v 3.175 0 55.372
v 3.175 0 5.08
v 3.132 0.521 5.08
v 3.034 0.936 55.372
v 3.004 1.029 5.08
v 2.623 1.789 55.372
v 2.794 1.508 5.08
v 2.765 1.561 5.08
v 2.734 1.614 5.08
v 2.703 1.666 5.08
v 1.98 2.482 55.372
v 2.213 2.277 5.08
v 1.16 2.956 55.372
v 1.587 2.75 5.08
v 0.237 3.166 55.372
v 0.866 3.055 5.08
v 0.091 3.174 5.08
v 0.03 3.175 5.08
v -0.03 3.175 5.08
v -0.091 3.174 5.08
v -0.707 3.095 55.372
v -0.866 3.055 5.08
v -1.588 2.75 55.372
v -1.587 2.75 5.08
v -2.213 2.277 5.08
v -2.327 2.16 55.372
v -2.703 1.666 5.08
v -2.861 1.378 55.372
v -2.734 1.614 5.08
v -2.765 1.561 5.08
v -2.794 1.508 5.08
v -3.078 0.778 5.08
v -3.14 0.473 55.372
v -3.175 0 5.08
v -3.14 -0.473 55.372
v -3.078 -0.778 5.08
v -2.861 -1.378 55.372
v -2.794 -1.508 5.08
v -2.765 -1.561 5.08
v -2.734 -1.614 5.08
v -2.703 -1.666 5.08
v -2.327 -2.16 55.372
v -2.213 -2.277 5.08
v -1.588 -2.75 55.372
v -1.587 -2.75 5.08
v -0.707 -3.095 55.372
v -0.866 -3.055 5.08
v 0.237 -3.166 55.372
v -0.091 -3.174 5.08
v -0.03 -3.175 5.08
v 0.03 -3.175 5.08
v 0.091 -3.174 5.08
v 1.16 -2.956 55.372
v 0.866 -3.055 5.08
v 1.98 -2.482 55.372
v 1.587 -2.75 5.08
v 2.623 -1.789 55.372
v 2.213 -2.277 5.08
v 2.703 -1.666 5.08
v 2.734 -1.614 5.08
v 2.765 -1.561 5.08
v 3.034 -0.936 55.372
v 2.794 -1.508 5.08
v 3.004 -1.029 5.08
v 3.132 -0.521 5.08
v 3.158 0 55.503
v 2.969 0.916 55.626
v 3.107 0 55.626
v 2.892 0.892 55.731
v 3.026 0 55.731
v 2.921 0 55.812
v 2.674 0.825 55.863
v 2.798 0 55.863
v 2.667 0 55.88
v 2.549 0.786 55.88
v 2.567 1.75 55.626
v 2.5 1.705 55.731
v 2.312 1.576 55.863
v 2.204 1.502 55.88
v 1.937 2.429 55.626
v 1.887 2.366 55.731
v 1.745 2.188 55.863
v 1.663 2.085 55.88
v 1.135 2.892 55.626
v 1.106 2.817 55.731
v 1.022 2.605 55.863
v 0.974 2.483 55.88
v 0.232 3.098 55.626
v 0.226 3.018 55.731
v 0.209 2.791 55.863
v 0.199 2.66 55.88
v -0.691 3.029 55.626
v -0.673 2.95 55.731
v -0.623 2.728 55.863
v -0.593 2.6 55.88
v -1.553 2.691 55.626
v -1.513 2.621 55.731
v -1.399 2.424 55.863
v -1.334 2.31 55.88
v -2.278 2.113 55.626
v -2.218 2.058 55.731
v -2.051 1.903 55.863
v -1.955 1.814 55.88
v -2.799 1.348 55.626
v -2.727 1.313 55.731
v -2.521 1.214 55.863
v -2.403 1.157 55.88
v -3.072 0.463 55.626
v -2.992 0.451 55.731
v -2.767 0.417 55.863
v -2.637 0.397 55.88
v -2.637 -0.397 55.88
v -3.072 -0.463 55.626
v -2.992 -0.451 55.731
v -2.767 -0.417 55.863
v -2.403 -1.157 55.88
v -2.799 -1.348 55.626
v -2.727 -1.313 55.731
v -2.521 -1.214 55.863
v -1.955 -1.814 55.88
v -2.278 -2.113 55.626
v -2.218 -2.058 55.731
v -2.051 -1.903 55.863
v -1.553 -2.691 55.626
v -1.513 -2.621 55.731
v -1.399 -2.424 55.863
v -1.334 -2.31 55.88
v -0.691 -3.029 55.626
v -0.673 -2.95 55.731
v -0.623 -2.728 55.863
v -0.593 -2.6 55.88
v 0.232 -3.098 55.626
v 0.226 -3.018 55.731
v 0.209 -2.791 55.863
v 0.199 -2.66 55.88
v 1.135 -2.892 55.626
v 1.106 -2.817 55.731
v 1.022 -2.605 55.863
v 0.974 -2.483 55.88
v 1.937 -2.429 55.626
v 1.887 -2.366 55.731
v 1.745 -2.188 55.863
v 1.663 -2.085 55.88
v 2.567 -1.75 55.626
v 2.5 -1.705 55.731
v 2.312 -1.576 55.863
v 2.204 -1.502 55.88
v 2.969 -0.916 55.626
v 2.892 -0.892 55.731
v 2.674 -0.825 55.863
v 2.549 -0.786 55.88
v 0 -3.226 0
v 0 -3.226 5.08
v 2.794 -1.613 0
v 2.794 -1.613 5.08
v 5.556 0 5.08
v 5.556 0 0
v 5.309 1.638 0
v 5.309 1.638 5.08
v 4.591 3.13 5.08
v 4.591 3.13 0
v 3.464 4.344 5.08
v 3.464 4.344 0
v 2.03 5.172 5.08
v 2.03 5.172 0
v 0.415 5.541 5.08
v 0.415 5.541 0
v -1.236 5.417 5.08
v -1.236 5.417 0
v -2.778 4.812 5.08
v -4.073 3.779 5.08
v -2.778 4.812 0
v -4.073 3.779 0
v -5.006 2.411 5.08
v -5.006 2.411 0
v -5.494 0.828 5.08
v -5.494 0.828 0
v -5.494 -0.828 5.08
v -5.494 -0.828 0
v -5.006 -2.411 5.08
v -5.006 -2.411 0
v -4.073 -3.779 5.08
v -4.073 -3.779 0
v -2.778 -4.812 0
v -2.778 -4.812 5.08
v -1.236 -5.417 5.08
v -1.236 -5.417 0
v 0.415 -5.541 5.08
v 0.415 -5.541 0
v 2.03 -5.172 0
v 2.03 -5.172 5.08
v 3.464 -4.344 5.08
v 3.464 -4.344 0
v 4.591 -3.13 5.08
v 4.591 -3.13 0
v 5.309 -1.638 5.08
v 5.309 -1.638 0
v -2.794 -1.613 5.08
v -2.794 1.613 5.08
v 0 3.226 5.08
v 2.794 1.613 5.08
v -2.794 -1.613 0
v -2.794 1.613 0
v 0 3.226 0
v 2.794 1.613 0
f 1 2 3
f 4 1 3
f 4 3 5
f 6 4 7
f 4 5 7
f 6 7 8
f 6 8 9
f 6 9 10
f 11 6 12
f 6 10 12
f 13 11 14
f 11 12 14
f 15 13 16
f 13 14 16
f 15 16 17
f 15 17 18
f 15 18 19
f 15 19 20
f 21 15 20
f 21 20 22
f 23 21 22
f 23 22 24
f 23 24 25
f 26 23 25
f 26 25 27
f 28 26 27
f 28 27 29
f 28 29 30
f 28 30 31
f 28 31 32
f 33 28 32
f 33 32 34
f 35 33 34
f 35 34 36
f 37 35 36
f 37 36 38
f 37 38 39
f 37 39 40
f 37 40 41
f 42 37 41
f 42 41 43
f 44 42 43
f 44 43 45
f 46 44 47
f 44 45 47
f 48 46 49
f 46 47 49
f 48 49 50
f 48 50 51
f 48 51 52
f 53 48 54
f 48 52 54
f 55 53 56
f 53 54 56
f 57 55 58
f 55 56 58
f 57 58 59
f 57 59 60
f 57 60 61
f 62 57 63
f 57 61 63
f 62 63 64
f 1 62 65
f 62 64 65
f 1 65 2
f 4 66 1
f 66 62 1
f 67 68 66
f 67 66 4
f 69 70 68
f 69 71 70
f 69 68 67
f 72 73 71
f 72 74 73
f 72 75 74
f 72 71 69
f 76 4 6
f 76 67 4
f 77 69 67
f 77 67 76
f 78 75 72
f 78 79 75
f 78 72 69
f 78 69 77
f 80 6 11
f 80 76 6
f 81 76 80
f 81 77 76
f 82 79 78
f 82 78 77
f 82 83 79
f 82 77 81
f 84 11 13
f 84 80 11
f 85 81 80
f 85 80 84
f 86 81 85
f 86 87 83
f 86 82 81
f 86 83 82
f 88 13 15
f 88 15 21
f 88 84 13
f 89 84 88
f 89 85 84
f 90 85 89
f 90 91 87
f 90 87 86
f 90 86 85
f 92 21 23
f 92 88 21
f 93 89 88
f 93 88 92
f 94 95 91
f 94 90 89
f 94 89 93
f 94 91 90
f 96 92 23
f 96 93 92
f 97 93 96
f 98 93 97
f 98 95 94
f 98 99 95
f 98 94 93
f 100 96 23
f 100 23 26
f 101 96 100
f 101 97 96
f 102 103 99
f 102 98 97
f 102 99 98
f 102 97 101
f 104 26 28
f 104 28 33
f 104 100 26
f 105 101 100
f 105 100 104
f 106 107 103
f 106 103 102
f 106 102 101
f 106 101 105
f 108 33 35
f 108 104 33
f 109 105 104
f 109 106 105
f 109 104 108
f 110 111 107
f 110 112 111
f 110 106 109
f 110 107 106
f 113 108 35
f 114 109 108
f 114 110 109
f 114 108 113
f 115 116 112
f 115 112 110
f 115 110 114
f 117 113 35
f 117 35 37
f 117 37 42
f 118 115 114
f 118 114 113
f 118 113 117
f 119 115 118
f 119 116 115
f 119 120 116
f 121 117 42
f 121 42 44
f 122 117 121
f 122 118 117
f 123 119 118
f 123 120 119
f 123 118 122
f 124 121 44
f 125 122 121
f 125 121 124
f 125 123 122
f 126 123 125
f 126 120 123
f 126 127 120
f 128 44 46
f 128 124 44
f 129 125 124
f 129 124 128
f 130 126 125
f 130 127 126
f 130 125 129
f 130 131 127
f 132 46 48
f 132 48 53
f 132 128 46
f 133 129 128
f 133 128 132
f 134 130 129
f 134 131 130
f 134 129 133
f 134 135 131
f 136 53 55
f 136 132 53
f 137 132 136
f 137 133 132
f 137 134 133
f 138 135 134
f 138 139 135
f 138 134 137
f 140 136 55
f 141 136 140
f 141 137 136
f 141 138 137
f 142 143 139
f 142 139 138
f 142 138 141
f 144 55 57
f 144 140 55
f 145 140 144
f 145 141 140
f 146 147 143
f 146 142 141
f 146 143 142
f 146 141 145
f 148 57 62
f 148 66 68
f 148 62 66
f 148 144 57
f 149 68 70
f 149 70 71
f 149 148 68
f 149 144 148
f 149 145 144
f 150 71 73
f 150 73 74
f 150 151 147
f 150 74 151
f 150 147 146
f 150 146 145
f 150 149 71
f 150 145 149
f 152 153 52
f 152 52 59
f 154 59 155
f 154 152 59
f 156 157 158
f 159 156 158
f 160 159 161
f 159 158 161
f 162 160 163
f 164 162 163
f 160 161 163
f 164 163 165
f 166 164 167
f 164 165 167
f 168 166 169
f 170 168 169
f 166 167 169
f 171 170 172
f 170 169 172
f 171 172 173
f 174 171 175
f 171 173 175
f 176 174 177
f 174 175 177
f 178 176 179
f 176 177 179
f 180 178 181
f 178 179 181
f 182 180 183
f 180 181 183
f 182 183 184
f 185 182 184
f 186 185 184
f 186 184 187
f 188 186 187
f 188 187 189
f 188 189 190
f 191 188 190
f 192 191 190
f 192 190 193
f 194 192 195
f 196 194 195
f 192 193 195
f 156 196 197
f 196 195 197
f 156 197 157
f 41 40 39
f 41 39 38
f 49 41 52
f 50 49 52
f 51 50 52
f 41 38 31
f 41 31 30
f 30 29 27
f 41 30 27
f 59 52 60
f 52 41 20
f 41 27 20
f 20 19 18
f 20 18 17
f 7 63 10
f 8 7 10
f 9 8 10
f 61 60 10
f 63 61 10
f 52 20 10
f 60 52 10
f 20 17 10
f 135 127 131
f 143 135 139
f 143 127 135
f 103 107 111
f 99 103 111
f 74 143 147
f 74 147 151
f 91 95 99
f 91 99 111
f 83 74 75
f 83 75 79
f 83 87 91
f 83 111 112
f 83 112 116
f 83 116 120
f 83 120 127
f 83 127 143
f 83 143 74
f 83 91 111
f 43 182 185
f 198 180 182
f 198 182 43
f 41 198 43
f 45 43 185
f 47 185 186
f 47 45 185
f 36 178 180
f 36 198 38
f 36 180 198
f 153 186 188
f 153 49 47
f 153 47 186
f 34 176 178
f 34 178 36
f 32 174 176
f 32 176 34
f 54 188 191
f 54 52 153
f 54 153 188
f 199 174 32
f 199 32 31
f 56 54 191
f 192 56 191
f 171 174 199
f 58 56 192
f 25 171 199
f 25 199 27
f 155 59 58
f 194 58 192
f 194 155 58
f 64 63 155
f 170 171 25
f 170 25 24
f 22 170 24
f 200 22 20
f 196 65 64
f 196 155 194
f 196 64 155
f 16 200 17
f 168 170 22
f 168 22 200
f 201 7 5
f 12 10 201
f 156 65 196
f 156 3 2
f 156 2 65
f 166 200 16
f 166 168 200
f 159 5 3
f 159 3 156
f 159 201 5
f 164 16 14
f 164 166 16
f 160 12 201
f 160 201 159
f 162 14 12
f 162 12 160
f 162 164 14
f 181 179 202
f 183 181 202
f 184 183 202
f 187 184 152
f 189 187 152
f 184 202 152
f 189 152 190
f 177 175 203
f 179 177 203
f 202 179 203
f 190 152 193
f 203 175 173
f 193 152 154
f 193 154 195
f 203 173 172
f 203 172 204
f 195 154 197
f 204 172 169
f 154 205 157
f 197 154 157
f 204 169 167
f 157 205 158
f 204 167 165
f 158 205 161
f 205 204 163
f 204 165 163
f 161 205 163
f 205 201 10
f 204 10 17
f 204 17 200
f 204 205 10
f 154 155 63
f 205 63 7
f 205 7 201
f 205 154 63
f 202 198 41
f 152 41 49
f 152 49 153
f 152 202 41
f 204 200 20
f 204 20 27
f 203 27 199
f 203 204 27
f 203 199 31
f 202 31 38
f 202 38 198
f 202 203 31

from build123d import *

# Parameters (mm, degrees)
SKETCH1_R           = 5.55625
BOSS_EXTRUDE1_DEPTH = 5.08
SKETCH2_R           = 3.175
BOSS_EXTRUDE2_DEPTH = 50.8
FILLET1_R           = 0.508


with BuildPart() as part:
    # Sketch1 → Boss-Extrude1 (new body)
    with BuildSketch(Plane.XY):
        Circle(SKETCH1_R)
        Polygon((2.794, 1.613116652), (0, 3.226233304), (-2.794, 1.613116652), (-2.794, -1.613116652), (0, -3.226233304), (2.794, -1.613116652), align=None, mode=Mode.SUBTRACT)
    extrude(amount=BOSS_EXTRUDE1_DEPTH)

    # Sketch2 → Boss-Extrude2 (add)
    with BuildSketch(Plane.XY.offset(5.08)):
        Circle(SKETCH2_R)
    extrude(amount=BOSS_EXTRUDE2_DEPTH)

    # Fillet1
    fillet1_edges = [part.edges().sort_by_distance(p)[0] for p in [
        (-3.175, 0, 55.88),
    ]]
    fillet(fillet1_edges, radius=FILLET1_R)


solid = part.part
